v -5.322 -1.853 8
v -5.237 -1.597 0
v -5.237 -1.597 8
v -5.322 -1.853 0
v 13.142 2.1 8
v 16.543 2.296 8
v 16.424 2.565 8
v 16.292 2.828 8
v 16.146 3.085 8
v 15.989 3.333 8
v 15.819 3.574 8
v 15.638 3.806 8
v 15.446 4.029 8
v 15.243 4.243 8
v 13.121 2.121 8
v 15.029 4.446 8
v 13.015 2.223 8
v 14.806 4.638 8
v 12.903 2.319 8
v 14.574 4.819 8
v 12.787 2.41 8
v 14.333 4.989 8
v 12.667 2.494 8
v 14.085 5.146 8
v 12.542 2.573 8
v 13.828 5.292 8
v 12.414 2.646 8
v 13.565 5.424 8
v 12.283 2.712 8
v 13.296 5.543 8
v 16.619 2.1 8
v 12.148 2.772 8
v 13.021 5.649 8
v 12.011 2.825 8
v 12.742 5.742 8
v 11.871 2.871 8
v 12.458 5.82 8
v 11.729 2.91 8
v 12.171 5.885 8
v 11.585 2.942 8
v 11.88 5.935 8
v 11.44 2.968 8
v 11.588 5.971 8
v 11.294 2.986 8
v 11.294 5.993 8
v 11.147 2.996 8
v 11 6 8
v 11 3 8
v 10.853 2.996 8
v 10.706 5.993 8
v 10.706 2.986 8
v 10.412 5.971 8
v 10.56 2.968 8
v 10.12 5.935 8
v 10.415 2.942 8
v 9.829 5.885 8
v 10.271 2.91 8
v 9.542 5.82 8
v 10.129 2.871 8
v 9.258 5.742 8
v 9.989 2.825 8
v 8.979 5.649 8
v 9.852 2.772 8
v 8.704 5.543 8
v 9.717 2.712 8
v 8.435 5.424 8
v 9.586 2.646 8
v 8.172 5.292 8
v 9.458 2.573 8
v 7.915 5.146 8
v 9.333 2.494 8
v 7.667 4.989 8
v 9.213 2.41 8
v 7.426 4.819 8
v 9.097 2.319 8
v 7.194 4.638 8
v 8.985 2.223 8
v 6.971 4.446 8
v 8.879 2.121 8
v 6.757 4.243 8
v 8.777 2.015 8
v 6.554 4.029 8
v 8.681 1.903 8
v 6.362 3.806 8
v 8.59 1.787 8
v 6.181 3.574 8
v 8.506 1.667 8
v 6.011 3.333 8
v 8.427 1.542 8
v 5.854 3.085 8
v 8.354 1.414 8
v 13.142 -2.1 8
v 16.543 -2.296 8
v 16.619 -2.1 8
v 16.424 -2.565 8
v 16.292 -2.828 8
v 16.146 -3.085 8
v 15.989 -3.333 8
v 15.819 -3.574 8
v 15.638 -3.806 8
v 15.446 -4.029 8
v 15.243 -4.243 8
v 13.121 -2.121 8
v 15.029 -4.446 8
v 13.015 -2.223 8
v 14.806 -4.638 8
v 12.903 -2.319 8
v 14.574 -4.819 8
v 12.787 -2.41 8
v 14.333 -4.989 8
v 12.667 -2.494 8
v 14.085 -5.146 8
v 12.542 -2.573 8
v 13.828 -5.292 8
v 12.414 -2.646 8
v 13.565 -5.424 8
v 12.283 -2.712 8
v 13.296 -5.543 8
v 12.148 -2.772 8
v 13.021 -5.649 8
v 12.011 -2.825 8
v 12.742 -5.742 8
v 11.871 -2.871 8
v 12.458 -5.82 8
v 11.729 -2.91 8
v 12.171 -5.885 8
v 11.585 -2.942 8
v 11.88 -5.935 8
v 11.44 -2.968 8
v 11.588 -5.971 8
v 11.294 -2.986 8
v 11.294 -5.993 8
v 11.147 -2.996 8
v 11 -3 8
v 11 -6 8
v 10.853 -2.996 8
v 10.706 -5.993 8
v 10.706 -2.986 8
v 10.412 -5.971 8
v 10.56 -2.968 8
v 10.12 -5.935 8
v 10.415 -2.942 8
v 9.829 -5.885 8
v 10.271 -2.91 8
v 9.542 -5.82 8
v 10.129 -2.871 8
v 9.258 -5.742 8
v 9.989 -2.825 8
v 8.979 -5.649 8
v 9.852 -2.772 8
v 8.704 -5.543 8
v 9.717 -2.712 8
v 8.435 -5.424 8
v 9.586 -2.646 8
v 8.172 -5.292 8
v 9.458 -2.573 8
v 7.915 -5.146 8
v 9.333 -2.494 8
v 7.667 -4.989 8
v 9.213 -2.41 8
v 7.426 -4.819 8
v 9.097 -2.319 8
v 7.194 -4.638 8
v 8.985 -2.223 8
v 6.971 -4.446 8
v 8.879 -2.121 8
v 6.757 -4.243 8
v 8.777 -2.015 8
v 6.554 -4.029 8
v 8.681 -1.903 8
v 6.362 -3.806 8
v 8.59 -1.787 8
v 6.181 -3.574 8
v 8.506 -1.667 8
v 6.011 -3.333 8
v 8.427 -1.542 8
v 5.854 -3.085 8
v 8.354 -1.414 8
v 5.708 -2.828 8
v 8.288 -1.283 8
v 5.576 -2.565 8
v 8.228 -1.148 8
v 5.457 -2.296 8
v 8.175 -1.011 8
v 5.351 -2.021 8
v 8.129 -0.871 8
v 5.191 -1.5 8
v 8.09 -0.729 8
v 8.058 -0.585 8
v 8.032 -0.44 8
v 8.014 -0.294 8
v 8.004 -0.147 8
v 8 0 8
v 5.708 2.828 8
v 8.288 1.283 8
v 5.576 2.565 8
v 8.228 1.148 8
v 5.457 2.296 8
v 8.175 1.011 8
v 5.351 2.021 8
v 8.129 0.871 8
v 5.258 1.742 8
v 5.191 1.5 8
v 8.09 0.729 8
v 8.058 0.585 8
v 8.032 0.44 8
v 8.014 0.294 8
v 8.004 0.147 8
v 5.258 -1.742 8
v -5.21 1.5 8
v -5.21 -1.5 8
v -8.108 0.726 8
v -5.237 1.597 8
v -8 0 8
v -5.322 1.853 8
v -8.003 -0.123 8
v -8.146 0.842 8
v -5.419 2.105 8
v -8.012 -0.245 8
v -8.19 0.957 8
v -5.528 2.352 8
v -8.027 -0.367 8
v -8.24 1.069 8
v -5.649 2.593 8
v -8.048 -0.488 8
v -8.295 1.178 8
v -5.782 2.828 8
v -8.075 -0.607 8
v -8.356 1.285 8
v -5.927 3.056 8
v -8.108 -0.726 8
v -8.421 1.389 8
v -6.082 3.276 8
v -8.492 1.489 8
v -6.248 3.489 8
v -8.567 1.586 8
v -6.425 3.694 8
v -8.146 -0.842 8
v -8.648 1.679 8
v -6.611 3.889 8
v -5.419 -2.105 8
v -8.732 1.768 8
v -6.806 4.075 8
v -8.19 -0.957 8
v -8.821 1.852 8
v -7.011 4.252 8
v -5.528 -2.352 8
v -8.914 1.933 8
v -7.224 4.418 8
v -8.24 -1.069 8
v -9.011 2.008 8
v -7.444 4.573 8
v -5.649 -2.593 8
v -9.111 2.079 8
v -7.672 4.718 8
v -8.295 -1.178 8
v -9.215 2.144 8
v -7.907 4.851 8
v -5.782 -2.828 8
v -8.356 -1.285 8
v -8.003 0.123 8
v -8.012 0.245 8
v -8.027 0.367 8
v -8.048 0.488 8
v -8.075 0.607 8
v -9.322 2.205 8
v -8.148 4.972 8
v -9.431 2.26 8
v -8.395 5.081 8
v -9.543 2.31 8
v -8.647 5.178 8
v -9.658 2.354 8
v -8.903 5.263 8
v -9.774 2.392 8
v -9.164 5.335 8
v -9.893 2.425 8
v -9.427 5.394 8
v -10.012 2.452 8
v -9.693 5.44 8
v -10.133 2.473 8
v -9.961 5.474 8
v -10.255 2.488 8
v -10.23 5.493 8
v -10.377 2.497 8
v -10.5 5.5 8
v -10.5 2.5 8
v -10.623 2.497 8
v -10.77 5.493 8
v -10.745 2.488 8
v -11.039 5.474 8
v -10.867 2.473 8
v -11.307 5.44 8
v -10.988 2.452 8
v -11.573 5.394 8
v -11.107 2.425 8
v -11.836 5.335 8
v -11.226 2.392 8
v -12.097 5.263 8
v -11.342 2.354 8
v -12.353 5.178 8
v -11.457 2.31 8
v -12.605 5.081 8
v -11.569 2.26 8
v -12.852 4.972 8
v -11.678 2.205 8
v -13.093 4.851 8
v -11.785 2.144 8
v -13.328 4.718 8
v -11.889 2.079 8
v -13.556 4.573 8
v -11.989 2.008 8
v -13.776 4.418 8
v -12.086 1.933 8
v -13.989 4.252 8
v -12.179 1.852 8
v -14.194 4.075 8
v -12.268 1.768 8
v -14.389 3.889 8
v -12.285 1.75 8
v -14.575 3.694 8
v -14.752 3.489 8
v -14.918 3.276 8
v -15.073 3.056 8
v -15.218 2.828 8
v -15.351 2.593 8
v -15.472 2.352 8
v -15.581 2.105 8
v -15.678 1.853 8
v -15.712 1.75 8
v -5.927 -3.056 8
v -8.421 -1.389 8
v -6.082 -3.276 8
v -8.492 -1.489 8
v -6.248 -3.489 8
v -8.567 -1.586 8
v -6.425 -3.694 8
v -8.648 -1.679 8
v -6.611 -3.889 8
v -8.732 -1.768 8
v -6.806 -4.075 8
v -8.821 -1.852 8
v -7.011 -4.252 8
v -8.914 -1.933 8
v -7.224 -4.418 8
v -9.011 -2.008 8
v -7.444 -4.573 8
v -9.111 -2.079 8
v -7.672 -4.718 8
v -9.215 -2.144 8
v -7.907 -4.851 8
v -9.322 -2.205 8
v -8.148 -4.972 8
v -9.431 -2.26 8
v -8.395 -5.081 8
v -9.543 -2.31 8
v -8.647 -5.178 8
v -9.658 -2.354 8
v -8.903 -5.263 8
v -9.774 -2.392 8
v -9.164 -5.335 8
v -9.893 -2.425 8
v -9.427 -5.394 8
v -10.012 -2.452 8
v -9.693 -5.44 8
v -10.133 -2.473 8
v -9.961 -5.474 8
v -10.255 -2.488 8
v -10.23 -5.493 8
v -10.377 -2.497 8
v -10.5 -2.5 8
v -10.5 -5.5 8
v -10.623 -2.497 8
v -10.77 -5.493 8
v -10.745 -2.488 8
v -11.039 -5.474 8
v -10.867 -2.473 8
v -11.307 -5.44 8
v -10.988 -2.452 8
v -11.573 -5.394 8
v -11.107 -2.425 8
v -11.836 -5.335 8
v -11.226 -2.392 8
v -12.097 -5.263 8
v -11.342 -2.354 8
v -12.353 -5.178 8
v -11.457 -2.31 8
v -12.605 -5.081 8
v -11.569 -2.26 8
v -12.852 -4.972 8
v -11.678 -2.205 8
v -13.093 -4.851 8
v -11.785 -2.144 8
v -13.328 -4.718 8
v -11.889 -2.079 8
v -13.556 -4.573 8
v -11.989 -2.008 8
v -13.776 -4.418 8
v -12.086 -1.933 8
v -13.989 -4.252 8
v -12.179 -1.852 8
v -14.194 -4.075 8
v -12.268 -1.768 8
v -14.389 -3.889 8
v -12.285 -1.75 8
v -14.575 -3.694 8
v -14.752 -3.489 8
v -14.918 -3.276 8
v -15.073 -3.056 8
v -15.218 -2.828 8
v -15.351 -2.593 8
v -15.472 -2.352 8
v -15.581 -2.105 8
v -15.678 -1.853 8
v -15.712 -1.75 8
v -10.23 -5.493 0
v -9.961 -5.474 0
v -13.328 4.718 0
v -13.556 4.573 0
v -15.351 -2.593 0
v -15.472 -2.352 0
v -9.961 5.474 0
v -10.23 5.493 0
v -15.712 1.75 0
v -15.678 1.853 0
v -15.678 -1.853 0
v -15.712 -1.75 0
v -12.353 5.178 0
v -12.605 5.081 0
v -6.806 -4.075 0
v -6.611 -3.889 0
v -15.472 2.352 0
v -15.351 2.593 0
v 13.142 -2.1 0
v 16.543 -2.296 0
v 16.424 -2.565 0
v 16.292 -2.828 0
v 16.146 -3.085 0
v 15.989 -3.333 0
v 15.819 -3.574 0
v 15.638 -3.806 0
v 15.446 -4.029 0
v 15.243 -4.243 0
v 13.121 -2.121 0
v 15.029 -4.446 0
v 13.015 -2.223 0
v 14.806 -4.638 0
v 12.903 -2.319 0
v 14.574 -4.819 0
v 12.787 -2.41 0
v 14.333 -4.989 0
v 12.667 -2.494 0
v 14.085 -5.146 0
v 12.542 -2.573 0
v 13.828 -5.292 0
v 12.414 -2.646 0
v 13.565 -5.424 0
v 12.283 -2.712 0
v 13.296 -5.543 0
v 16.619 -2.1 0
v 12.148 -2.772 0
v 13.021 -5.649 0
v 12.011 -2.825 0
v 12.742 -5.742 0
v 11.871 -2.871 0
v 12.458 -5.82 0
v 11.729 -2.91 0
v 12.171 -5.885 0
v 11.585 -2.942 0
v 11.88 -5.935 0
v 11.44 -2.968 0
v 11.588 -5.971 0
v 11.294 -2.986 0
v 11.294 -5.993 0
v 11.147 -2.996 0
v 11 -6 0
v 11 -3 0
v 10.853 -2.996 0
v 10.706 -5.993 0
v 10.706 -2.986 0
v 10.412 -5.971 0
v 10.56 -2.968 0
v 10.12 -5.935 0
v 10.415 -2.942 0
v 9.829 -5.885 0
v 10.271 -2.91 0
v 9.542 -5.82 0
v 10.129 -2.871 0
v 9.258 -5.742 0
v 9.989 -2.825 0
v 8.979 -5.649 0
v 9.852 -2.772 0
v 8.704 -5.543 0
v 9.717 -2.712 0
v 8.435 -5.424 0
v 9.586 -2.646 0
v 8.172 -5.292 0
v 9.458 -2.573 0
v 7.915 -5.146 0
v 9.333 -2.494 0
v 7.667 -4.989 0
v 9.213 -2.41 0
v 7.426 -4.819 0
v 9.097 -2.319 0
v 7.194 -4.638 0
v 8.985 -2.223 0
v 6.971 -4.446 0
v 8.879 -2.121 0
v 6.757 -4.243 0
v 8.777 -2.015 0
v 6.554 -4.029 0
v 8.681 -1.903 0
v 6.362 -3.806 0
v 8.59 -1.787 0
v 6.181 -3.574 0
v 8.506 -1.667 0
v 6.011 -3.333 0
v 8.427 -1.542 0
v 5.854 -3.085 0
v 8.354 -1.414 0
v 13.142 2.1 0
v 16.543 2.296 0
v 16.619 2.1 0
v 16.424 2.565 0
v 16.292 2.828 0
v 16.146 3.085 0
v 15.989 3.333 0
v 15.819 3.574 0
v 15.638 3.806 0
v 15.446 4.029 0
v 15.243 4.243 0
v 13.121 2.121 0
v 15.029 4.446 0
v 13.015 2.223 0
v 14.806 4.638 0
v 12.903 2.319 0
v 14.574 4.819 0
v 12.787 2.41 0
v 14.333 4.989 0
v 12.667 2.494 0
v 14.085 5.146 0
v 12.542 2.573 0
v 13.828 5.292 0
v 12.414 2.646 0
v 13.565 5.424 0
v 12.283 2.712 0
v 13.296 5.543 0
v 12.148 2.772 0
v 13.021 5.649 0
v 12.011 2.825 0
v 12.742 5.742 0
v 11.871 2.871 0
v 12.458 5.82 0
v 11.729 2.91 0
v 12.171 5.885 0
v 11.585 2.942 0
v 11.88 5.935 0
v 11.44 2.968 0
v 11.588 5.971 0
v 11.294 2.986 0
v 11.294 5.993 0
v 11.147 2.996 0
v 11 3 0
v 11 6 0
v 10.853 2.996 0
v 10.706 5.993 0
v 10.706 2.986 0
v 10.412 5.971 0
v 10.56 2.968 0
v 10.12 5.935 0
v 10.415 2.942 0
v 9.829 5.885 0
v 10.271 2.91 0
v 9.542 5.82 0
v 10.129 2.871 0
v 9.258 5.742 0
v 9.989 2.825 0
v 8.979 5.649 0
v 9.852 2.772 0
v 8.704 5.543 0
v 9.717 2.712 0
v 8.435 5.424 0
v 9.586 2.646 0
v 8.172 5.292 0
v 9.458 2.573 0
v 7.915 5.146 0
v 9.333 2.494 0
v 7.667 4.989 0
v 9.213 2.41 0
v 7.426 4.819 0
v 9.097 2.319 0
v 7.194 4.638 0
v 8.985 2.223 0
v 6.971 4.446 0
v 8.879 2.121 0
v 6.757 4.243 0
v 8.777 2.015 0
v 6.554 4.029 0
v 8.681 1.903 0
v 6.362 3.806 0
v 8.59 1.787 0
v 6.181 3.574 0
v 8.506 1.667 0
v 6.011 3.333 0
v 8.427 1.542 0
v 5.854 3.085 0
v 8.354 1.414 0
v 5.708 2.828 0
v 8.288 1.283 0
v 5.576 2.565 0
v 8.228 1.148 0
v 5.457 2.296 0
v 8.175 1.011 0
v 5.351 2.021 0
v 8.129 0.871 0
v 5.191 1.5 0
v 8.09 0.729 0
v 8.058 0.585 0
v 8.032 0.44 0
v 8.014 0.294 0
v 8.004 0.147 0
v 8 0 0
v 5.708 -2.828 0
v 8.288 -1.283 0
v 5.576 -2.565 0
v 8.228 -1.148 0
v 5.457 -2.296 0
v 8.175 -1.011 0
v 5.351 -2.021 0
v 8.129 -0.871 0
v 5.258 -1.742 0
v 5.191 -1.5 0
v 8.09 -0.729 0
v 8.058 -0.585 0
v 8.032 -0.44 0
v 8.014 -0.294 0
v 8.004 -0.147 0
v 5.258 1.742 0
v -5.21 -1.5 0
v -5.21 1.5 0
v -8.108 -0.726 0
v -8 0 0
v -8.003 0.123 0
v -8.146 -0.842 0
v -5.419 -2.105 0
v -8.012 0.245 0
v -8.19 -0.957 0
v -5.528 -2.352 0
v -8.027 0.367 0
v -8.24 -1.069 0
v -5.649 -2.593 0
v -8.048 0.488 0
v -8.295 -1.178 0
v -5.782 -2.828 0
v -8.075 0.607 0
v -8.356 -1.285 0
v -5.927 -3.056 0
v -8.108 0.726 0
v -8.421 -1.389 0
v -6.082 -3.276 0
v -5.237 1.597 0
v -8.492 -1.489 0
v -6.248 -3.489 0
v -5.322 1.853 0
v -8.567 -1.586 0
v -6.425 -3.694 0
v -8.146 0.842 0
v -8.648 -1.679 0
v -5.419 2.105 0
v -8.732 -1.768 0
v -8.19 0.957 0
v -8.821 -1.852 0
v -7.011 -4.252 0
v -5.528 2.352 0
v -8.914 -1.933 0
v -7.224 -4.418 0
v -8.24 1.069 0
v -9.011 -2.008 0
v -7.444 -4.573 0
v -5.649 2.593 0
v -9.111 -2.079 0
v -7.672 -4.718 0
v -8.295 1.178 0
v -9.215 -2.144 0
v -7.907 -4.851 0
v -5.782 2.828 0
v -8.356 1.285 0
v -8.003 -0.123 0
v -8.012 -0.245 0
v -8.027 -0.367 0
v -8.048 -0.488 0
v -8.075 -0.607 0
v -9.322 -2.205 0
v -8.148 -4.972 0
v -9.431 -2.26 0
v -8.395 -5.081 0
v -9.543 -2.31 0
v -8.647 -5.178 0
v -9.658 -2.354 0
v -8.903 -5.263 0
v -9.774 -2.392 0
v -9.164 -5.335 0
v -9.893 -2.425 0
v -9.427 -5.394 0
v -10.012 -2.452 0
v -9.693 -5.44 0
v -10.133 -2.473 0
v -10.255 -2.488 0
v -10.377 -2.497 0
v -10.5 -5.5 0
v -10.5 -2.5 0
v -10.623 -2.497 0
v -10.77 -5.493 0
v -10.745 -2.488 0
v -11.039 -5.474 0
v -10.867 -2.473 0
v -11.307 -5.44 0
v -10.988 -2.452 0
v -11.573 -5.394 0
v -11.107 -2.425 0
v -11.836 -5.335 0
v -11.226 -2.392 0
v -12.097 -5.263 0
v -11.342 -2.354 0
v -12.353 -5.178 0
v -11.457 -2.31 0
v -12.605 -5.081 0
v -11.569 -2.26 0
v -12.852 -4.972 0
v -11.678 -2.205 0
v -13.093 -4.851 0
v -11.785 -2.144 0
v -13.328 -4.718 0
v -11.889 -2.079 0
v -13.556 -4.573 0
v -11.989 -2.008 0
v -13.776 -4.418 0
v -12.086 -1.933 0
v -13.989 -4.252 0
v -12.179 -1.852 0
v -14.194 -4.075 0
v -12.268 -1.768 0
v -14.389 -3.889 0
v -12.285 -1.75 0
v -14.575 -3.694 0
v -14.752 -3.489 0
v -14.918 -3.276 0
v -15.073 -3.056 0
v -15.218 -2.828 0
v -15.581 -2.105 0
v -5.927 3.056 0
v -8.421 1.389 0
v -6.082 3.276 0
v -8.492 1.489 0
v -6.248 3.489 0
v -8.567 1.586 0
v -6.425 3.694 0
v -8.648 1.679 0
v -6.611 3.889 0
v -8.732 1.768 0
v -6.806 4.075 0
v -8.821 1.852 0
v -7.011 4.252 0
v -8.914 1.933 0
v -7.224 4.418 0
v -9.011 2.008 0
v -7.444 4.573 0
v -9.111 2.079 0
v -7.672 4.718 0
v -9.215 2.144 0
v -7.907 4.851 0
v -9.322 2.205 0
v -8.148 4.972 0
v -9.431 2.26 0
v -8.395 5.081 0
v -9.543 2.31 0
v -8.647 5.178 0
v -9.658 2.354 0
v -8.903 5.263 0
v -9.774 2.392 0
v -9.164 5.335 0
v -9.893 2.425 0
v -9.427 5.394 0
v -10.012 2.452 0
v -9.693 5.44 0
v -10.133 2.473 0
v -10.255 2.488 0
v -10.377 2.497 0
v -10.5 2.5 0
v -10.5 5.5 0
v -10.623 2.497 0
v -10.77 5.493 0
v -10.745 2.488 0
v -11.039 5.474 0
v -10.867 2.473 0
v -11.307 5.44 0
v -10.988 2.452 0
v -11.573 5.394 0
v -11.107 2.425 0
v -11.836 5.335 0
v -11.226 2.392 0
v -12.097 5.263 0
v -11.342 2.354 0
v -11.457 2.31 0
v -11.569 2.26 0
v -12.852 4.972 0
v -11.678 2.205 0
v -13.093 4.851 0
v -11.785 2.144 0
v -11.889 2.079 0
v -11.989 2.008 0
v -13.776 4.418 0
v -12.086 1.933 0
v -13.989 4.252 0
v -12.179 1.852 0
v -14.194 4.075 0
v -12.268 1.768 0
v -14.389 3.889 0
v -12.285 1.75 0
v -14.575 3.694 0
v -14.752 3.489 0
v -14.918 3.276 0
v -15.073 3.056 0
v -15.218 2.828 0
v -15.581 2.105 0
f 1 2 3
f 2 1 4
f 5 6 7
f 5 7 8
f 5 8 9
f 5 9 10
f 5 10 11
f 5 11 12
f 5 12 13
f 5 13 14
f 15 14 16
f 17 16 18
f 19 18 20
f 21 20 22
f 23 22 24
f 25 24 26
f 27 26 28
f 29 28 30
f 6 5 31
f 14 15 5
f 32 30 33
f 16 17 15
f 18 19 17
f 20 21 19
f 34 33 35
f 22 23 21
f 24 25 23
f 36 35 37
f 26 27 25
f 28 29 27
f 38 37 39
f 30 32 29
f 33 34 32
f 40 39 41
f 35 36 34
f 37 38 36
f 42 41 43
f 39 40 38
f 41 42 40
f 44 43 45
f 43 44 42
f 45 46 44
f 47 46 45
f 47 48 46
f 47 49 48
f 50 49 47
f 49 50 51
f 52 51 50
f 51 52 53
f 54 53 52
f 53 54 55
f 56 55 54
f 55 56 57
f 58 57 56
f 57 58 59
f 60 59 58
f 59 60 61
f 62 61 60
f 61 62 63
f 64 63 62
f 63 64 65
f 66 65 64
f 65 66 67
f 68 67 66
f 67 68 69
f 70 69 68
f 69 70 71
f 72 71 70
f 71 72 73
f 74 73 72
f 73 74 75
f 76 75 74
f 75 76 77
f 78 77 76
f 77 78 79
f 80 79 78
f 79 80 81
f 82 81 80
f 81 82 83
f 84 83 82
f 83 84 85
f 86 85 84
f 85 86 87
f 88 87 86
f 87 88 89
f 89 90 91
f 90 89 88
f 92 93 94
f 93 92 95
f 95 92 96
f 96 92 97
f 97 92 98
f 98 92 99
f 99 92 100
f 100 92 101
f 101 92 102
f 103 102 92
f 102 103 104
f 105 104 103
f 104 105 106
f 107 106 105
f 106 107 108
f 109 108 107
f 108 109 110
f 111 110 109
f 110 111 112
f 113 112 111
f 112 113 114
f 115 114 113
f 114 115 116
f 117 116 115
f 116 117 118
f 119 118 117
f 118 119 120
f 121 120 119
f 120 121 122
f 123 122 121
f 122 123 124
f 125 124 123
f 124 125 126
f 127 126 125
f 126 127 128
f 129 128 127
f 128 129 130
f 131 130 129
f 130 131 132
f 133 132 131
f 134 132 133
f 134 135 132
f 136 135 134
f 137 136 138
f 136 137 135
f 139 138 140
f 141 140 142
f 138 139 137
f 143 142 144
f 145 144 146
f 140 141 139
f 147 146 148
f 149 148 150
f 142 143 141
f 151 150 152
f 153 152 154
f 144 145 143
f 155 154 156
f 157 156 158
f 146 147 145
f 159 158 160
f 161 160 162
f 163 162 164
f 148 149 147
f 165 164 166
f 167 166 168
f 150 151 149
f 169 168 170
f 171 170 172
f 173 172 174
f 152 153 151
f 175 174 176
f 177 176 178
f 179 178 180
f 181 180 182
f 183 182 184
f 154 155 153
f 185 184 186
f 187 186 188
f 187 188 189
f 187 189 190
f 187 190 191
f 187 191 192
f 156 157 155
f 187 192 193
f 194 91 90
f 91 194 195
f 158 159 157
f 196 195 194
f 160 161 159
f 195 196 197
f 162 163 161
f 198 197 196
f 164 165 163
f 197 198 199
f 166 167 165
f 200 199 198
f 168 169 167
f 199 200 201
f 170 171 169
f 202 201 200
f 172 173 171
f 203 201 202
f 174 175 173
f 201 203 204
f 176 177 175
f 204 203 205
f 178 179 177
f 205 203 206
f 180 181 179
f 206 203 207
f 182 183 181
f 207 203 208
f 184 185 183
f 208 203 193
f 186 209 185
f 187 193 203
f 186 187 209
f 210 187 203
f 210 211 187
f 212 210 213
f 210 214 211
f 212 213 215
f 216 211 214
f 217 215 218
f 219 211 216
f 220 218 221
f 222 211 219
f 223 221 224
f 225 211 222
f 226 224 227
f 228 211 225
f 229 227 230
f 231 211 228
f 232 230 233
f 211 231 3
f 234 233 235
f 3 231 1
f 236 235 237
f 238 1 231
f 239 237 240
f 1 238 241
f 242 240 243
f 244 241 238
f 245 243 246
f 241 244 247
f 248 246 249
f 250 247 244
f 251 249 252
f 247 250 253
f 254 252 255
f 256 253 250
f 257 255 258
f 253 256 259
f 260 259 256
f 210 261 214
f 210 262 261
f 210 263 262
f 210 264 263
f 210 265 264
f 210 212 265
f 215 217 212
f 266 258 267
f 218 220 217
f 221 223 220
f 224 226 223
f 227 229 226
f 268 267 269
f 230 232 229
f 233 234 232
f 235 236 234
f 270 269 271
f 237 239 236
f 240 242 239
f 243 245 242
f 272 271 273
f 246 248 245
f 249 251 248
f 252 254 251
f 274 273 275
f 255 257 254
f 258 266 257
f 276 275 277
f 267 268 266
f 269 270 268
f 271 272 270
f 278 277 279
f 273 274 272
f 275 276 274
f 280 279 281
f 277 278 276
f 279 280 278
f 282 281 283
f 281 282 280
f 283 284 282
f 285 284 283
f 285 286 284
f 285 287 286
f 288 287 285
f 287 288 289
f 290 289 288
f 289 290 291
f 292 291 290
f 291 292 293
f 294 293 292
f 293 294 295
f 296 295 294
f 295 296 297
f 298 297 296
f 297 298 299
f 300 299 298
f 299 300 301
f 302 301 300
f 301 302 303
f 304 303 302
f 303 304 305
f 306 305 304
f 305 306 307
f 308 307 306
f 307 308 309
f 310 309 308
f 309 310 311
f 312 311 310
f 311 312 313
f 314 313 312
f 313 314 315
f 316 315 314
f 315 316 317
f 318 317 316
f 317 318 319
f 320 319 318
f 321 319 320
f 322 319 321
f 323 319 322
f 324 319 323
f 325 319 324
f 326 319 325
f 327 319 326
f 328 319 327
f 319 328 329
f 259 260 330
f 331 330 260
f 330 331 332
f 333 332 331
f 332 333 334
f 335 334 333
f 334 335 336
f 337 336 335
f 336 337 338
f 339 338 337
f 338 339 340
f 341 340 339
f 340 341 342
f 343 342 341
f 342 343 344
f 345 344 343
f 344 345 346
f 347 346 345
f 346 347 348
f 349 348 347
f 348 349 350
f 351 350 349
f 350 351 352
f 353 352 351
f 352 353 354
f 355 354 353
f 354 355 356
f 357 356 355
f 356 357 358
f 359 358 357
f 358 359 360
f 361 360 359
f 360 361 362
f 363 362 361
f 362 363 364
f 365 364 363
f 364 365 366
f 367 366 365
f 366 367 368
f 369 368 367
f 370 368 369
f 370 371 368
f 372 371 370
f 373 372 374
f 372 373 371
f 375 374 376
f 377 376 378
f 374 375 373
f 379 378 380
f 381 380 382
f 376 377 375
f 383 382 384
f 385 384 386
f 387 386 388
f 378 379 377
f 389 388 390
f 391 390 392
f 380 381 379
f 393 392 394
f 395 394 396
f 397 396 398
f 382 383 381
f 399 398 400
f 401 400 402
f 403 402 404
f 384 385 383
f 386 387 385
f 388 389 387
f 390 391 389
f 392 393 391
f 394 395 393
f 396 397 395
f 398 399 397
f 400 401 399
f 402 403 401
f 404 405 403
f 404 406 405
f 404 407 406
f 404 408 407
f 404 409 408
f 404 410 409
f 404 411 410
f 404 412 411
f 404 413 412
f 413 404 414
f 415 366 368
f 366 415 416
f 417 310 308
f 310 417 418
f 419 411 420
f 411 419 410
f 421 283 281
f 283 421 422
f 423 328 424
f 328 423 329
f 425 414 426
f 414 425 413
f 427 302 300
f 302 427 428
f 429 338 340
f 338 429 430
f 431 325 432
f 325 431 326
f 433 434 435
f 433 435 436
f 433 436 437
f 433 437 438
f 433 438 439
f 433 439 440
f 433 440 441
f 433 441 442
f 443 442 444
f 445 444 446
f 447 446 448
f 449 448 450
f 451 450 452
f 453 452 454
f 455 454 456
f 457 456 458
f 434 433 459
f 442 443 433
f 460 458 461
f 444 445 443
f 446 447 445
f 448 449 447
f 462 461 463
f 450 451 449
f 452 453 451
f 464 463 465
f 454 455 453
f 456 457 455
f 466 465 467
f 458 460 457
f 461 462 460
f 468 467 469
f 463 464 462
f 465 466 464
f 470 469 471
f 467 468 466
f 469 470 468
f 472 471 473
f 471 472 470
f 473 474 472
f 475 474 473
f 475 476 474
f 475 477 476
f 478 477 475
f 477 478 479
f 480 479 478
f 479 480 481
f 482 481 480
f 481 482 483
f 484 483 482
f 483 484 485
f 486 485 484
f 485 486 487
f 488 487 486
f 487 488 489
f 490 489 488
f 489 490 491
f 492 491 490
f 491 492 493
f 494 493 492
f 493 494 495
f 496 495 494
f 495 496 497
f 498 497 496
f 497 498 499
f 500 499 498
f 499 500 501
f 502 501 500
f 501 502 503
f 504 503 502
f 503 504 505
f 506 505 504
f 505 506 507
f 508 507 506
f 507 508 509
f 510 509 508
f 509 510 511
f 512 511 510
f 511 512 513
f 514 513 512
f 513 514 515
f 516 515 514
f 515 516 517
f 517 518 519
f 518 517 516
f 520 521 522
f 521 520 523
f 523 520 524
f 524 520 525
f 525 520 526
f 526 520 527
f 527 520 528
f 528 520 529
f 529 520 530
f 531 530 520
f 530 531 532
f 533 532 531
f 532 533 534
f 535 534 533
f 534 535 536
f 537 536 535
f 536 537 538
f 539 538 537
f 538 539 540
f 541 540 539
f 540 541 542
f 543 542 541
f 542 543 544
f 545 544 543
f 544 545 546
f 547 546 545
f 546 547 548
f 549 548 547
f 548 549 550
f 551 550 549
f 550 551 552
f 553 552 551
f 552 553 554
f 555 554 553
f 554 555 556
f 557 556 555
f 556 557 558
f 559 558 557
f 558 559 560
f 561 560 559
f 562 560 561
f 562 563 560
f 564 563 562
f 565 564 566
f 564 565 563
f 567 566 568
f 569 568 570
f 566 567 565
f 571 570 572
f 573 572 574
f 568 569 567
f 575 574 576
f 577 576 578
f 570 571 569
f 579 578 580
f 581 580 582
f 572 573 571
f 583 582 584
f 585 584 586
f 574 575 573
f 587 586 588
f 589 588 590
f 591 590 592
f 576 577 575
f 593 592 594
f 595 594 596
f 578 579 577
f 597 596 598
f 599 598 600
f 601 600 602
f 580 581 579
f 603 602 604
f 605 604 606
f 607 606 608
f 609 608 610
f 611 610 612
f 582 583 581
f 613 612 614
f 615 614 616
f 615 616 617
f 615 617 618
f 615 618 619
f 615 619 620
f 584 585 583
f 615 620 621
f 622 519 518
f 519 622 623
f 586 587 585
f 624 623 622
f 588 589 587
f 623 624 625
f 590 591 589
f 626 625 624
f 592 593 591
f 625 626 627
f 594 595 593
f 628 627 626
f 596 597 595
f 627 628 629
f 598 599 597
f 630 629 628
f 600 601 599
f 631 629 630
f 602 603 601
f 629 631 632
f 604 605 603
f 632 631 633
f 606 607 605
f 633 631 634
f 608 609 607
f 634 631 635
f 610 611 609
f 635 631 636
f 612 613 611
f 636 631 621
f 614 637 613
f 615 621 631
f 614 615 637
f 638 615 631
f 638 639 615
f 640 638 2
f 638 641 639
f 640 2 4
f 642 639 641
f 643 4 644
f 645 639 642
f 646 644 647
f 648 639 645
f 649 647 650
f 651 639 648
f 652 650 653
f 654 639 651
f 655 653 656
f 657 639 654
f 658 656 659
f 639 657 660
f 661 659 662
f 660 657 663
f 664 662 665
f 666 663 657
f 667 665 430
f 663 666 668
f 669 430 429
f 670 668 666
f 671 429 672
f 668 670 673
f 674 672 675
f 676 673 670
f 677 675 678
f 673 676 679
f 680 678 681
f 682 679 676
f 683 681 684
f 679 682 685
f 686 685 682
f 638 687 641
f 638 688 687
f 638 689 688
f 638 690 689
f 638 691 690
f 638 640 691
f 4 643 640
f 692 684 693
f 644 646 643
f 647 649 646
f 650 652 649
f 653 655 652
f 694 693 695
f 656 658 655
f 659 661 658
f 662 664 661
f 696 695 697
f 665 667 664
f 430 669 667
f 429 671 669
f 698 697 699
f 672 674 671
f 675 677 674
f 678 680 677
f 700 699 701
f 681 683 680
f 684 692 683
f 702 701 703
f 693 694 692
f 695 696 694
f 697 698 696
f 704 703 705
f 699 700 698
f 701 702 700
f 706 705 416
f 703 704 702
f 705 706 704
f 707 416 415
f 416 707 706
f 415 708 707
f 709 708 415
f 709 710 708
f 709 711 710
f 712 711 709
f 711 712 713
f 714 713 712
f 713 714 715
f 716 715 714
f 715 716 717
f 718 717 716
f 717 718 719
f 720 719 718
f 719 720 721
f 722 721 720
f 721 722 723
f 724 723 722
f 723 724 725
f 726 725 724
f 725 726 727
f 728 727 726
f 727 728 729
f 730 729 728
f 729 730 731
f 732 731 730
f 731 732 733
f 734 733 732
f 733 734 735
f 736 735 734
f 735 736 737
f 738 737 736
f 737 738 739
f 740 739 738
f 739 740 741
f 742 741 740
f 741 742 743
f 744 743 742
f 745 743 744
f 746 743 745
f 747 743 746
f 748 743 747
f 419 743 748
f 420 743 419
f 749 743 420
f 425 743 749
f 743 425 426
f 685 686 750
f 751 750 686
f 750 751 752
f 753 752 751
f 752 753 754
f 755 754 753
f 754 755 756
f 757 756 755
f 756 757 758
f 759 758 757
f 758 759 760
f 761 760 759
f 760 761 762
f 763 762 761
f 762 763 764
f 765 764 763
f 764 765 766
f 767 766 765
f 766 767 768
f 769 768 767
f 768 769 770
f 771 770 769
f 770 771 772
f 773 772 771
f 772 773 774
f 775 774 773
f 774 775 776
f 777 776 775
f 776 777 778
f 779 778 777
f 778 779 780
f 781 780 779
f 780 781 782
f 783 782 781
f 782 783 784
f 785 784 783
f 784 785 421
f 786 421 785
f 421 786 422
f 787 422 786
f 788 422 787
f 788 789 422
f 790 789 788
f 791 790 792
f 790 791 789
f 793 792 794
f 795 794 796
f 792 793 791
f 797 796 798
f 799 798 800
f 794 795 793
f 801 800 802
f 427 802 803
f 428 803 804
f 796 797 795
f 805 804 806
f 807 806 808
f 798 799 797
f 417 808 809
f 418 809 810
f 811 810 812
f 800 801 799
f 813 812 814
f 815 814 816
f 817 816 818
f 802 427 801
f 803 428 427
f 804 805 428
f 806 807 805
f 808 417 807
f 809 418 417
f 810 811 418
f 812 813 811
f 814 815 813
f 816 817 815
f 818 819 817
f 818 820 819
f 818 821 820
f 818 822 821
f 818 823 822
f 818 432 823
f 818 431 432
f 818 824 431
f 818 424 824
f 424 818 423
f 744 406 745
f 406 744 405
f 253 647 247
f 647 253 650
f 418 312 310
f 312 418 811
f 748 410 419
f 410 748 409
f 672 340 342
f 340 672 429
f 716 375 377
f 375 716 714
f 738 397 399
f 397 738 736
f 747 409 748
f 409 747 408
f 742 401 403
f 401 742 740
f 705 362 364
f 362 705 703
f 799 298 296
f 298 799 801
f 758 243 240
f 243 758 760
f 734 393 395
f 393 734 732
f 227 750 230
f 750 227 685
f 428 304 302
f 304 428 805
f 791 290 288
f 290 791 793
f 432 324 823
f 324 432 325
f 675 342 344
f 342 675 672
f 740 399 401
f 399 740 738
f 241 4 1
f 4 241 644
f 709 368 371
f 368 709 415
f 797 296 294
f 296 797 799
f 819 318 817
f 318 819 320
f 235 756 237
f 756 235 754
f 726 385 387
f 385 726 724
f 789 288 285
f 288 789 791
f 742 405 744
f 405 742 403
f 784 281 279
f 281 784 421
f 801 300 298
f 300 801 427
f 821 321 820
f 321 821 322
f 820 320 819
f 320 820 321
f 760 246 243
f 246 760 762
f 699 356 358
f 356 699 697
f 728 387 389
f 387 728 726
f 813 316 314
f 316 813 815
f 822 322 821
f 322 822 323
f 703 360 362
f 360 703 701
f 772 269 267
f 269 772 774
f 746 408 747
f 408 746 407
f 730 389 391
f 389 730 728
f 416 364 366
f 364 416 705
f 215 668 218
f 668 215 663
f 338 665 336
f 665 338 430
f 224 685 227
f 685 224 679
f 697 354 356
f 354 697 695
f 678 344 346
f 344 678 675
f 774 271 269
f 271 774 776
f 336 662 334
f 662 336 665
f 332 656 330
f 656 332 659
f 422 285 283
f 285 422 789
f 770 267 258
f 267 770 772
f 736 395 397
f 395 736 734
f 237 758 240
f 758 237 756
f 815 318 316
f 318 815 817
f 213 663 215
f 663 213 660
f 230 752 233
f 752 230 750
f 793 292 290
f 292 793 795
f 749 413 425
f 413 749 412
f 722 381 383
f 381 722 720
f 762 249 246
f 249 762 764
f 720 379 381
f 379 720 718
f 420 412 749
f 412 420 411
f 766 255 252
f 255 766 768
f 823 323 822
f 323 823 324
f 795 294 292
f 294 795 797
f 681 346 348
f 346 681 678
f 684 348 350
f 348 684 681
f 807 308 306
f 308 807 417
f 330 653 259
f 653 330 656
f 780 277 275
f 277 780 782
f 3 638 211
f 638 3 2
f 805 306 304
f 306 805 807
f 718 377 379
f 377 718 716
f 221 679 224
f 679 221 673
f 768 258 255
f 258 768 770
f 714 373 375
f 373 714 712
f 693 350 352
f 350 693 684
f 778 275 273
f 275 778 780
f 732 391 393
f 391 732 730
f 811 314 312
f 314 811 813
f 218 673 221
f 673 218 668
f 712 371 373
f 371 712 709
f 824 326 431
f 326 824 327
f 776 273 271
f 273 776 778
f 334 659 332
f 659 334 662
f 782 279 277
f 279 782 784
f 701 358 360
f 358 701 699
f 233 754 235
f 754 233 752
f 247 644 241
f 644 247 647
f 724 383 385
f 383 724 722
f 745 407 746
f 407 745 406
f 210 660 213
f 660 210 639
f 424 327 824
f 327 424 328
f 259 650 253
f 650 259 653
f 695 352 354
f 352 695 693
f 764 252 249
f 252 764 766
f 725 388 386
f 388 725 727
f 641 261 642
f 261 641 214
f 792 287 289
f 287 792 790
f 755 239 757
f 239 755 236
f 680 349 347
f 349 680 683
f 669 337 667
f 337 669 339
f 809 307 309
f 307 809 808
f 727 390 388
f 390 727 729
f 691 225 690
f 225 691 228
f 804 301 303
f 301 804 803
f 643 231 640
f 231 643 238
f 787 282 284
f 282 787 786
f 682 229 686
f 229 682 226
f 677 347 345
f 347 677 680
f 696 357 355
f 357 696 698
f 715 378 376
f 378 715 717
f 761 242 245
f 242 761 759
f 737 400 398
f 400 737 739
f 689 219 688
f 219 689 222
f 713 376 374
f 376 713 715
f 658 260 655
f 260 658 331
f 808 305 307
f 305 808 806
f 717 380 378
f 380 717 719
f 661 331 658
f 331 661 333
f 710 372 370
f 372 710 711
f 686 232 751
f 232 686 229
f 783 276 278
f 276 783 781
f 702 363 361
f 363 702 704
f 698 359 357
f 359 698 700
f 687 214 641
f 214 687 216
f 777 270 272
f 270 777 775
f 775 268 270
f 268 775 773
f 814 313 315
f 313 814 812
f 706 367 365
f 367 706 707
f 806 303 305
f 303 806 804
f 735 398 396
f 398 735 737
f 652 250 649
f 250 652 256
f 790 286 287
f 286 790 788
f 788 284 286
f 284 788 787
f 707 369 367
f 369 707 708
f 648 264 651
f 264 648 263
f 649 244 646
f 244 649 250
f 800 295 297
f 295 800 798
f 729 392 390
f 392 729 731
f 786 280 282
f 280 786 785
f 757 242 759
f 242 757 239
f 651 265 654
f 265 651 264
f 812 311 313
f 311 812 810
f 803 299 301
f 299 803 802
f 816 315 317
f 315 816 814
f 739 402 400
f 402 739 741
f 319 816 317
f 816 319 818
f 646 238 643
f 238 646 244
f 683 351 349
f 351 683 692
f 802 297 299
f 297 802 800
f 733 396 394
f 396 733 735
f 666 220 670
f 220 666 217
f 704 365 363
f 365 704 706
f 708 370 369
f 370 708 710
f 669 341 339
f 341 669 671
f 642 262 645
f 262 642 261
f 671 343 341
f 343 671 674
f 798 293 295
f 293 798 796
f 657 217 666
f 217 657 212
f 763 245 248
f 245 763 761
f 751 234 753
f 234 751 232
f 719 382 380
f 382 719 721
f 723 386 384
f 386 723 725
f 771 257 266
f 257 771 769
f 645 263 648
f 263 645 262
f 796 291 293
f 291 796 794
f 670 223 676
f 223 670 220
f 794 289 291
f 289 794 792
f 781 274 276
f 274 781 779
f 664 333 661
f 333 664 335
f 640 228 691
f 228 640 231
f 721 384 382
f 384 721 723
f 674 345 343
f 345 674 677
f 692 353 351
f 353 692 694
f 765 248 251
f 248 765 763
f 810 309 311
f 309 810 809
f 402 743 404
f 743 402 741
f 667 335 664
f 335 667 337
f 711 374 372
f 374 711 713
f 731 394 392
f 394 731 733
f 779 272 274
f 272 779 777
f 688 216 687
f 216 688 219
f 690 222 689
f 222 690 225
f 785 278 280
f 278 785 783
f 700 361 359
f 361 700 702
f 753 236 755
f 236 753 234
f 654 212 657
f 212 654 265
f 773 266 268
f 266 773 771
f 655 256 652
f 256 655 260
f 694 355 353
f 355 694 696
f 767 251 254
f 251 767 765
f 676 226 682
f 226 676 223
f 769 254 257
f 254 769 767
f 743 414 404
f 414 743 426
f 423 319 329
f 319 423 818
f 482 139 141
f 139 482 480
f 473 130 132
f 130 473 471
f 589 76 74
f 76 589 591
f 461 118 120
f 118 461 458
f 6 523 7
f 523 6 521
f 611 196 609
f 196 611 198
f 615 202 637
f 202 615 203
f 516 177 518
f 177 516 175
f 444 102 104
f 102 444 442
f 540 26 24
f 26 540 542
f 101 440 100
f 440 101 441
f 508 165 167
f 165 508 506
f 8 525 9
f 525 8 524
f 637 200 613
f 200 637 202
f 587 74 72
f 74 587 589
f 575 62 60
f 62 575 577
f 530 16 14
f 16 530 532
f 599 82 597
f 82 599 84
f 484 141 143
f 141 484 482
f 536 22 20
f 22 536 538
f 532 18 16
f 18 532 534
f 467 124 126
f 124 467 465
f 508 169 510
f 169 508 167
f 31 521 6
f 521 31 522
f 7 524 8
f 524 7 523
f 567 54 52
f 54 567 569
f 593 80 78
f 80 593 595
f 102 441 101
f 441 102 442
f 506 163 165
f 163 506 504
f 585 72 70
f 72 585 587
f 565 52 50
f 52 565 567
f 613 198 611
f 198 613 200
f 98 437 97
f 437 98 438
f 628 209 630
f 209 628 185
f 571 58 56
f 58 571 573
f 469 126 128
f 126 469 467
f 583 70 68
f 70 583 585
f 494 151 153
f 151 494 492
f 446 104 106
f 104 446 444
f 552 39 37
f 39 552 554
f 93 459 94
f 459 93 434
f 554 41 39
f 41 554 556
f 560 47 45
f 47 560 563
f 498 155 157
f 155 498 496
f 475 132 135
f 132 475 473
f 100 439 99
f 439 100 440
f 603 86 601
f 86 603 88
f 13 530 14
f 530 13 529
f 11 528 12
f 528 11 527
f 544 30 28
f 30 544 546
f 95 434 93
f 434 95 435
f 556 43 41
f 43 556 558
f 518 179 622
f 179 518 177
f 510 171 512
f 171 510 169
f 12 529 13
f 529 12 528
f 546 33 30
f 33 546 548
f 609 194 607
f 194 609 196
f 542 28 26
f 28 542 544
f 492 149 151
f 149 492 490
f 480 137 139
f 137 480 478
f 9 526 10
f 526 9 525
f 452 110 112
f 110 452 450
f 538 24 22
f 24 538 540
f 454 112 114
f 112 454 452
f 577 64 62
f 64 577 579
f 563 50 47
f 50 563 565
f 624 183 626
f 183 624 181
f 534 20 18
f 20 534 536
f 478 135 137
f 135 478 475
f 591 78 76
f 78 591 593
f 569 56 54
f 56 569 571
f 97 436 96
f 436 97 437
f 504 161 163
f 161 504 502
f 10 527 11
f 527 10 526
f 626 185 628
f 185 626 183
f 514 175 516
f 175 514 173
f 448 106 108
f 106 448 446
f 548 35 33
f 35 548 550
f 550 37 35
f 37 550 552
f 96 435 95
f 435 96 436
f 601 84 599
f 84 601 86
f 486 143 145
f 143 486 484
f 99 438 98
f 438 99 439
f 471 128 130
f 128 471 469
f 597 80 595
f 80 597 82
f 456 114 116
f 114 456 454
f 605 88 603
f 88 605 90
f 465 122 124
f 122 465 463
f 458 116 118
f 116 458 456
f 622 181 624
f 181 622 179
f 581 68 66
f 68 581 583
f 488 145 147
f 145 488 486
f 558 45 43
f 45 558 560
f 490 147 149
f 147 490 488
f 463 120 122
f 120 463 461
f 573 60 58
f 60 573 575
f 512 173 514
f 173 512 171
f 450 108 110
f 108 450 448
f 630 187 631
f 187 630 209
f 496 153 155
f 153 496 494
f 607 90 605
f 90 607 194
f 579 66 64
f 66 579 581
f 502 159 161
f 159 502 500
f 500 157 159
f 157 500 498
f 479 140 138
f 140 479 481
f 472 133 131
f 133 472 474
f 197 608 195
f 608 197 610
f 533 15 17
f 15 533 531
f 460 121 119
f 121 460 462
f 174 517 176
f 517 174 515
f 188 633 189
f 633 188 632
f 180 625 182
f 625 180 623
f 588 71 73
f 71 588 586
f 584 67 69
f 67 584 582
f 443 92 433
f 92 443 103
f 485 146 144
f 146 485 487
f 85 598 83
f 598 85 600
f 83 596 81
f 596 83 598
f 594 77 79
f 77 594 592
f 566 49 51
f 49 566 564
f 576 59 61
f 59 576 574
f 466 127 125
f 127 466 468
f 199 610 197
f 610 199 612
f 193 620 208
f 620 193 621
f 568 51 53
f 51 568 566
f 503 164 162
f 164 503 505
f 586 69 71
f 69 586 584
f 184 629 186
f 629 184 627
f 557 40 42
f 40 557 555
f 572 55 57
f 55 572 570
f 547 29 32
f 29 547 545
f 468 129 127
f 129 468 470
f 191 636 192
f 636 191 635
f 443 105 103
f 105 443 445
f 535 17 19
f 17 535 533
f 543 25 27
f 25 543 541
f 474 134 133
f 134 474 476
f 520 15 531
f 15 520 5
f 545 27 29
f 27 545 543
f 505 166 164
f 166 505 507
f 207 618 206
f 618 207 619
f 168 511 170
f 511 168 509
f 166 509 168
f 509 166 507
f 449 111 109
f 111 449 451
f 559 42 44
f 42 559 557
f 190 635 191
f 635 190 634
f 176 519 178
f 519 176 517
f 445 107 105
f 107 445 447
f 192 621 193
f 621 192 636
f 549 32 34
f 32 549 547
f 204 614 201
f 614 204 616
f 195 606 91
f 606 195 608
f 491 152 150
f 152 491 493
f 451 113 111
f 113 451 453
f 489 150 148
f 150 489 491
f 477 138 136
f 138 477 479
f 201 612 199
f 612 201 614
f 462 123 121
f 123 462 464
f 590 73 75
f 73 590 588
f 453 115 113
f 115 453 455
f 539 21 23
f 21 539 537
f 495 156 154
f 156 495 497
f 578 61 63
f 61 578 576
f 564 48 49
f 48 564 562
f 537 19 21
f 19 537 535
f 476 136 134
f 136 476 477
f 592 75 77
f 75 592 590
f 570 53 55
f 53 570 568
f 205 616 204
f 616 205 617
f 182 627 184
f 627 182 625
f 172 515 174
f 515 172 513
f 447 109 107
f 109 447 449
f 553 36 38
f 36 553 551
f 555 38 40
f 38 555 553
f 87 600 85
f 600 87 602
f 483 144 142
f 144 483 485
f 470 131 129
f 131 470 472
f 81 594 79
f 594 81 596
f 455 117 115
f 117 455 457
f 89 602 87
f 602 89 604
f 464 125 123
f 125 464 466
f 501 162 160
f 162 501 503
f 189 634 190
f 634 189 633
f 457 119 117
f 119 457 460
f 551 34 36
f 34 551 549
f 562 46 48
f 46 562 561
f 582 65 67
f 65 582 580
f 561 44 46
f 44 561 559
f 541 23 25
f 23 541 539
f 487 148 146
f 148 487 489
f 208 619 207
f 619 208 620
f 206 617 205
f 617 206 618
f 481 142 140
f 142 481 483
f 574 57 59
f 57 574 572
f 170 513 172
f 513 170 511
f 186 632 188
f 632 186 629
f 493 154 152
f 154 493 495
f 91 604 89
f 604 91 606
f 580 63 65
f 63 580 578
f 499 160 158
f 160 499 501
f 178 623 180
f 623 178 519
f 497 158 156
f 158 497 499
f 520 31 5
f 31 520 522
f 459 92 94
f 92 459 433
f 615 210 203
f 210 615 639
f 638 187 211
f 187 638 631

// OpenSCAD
$fn=128;

wall = 3;
h = 8;

module clip(d) {
    difference() {
        cylinder(d = d + wall*2, h=h);
        cylinder(d=d, h=100);
        clip_hole = d*0.7;
        translate([0, -clip_hole/2, 0]) cube([100, clip_hole, 100]);
    }
}

tube_d = 5;
drive_d = 6;

translate([-8-tube_d/2, 0, 0]) rotate([0, 0, 180]) clip(d=tube_d);
translate([-8, -wall/2, 0]) cube([16, wall, h]);
translate([8+drive_d/2, 0, 0]) clip(d=drive_d);
